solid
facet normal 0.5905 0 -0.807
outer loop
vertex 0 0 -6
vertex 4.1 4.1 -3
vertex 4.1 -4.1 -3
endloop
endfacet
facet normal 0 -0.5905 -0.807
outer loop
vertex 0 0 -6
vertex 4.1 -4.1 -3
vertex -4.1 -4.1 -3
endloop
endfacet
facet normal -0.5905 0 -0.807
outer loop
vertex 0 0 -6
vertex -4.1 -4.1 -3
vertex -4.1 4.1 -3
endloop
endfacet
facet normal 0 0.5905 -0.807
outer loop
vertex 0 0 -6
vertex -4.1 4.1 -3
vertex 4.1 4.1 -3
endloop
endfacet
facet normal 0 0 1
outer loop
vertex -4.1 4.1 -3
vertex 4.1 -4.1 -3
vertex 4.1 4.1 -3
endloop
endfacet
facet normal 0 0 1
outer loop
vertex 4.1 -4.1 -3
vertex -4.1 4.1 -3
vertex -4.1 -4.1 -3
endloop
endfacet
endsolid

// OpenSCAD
polyhedron (points=[[4.1, 4.1, -3], [4.1, -4.1, -3], [-4.1, -4.1, -3], [-4.1, 4.1, -3], [0, 0, -6]], faces=[[1, 0, 4], [2, 1, 4], [3, 2, 4], [0, 3, 4], [0, 1, 2, 3]], convexity=2);
